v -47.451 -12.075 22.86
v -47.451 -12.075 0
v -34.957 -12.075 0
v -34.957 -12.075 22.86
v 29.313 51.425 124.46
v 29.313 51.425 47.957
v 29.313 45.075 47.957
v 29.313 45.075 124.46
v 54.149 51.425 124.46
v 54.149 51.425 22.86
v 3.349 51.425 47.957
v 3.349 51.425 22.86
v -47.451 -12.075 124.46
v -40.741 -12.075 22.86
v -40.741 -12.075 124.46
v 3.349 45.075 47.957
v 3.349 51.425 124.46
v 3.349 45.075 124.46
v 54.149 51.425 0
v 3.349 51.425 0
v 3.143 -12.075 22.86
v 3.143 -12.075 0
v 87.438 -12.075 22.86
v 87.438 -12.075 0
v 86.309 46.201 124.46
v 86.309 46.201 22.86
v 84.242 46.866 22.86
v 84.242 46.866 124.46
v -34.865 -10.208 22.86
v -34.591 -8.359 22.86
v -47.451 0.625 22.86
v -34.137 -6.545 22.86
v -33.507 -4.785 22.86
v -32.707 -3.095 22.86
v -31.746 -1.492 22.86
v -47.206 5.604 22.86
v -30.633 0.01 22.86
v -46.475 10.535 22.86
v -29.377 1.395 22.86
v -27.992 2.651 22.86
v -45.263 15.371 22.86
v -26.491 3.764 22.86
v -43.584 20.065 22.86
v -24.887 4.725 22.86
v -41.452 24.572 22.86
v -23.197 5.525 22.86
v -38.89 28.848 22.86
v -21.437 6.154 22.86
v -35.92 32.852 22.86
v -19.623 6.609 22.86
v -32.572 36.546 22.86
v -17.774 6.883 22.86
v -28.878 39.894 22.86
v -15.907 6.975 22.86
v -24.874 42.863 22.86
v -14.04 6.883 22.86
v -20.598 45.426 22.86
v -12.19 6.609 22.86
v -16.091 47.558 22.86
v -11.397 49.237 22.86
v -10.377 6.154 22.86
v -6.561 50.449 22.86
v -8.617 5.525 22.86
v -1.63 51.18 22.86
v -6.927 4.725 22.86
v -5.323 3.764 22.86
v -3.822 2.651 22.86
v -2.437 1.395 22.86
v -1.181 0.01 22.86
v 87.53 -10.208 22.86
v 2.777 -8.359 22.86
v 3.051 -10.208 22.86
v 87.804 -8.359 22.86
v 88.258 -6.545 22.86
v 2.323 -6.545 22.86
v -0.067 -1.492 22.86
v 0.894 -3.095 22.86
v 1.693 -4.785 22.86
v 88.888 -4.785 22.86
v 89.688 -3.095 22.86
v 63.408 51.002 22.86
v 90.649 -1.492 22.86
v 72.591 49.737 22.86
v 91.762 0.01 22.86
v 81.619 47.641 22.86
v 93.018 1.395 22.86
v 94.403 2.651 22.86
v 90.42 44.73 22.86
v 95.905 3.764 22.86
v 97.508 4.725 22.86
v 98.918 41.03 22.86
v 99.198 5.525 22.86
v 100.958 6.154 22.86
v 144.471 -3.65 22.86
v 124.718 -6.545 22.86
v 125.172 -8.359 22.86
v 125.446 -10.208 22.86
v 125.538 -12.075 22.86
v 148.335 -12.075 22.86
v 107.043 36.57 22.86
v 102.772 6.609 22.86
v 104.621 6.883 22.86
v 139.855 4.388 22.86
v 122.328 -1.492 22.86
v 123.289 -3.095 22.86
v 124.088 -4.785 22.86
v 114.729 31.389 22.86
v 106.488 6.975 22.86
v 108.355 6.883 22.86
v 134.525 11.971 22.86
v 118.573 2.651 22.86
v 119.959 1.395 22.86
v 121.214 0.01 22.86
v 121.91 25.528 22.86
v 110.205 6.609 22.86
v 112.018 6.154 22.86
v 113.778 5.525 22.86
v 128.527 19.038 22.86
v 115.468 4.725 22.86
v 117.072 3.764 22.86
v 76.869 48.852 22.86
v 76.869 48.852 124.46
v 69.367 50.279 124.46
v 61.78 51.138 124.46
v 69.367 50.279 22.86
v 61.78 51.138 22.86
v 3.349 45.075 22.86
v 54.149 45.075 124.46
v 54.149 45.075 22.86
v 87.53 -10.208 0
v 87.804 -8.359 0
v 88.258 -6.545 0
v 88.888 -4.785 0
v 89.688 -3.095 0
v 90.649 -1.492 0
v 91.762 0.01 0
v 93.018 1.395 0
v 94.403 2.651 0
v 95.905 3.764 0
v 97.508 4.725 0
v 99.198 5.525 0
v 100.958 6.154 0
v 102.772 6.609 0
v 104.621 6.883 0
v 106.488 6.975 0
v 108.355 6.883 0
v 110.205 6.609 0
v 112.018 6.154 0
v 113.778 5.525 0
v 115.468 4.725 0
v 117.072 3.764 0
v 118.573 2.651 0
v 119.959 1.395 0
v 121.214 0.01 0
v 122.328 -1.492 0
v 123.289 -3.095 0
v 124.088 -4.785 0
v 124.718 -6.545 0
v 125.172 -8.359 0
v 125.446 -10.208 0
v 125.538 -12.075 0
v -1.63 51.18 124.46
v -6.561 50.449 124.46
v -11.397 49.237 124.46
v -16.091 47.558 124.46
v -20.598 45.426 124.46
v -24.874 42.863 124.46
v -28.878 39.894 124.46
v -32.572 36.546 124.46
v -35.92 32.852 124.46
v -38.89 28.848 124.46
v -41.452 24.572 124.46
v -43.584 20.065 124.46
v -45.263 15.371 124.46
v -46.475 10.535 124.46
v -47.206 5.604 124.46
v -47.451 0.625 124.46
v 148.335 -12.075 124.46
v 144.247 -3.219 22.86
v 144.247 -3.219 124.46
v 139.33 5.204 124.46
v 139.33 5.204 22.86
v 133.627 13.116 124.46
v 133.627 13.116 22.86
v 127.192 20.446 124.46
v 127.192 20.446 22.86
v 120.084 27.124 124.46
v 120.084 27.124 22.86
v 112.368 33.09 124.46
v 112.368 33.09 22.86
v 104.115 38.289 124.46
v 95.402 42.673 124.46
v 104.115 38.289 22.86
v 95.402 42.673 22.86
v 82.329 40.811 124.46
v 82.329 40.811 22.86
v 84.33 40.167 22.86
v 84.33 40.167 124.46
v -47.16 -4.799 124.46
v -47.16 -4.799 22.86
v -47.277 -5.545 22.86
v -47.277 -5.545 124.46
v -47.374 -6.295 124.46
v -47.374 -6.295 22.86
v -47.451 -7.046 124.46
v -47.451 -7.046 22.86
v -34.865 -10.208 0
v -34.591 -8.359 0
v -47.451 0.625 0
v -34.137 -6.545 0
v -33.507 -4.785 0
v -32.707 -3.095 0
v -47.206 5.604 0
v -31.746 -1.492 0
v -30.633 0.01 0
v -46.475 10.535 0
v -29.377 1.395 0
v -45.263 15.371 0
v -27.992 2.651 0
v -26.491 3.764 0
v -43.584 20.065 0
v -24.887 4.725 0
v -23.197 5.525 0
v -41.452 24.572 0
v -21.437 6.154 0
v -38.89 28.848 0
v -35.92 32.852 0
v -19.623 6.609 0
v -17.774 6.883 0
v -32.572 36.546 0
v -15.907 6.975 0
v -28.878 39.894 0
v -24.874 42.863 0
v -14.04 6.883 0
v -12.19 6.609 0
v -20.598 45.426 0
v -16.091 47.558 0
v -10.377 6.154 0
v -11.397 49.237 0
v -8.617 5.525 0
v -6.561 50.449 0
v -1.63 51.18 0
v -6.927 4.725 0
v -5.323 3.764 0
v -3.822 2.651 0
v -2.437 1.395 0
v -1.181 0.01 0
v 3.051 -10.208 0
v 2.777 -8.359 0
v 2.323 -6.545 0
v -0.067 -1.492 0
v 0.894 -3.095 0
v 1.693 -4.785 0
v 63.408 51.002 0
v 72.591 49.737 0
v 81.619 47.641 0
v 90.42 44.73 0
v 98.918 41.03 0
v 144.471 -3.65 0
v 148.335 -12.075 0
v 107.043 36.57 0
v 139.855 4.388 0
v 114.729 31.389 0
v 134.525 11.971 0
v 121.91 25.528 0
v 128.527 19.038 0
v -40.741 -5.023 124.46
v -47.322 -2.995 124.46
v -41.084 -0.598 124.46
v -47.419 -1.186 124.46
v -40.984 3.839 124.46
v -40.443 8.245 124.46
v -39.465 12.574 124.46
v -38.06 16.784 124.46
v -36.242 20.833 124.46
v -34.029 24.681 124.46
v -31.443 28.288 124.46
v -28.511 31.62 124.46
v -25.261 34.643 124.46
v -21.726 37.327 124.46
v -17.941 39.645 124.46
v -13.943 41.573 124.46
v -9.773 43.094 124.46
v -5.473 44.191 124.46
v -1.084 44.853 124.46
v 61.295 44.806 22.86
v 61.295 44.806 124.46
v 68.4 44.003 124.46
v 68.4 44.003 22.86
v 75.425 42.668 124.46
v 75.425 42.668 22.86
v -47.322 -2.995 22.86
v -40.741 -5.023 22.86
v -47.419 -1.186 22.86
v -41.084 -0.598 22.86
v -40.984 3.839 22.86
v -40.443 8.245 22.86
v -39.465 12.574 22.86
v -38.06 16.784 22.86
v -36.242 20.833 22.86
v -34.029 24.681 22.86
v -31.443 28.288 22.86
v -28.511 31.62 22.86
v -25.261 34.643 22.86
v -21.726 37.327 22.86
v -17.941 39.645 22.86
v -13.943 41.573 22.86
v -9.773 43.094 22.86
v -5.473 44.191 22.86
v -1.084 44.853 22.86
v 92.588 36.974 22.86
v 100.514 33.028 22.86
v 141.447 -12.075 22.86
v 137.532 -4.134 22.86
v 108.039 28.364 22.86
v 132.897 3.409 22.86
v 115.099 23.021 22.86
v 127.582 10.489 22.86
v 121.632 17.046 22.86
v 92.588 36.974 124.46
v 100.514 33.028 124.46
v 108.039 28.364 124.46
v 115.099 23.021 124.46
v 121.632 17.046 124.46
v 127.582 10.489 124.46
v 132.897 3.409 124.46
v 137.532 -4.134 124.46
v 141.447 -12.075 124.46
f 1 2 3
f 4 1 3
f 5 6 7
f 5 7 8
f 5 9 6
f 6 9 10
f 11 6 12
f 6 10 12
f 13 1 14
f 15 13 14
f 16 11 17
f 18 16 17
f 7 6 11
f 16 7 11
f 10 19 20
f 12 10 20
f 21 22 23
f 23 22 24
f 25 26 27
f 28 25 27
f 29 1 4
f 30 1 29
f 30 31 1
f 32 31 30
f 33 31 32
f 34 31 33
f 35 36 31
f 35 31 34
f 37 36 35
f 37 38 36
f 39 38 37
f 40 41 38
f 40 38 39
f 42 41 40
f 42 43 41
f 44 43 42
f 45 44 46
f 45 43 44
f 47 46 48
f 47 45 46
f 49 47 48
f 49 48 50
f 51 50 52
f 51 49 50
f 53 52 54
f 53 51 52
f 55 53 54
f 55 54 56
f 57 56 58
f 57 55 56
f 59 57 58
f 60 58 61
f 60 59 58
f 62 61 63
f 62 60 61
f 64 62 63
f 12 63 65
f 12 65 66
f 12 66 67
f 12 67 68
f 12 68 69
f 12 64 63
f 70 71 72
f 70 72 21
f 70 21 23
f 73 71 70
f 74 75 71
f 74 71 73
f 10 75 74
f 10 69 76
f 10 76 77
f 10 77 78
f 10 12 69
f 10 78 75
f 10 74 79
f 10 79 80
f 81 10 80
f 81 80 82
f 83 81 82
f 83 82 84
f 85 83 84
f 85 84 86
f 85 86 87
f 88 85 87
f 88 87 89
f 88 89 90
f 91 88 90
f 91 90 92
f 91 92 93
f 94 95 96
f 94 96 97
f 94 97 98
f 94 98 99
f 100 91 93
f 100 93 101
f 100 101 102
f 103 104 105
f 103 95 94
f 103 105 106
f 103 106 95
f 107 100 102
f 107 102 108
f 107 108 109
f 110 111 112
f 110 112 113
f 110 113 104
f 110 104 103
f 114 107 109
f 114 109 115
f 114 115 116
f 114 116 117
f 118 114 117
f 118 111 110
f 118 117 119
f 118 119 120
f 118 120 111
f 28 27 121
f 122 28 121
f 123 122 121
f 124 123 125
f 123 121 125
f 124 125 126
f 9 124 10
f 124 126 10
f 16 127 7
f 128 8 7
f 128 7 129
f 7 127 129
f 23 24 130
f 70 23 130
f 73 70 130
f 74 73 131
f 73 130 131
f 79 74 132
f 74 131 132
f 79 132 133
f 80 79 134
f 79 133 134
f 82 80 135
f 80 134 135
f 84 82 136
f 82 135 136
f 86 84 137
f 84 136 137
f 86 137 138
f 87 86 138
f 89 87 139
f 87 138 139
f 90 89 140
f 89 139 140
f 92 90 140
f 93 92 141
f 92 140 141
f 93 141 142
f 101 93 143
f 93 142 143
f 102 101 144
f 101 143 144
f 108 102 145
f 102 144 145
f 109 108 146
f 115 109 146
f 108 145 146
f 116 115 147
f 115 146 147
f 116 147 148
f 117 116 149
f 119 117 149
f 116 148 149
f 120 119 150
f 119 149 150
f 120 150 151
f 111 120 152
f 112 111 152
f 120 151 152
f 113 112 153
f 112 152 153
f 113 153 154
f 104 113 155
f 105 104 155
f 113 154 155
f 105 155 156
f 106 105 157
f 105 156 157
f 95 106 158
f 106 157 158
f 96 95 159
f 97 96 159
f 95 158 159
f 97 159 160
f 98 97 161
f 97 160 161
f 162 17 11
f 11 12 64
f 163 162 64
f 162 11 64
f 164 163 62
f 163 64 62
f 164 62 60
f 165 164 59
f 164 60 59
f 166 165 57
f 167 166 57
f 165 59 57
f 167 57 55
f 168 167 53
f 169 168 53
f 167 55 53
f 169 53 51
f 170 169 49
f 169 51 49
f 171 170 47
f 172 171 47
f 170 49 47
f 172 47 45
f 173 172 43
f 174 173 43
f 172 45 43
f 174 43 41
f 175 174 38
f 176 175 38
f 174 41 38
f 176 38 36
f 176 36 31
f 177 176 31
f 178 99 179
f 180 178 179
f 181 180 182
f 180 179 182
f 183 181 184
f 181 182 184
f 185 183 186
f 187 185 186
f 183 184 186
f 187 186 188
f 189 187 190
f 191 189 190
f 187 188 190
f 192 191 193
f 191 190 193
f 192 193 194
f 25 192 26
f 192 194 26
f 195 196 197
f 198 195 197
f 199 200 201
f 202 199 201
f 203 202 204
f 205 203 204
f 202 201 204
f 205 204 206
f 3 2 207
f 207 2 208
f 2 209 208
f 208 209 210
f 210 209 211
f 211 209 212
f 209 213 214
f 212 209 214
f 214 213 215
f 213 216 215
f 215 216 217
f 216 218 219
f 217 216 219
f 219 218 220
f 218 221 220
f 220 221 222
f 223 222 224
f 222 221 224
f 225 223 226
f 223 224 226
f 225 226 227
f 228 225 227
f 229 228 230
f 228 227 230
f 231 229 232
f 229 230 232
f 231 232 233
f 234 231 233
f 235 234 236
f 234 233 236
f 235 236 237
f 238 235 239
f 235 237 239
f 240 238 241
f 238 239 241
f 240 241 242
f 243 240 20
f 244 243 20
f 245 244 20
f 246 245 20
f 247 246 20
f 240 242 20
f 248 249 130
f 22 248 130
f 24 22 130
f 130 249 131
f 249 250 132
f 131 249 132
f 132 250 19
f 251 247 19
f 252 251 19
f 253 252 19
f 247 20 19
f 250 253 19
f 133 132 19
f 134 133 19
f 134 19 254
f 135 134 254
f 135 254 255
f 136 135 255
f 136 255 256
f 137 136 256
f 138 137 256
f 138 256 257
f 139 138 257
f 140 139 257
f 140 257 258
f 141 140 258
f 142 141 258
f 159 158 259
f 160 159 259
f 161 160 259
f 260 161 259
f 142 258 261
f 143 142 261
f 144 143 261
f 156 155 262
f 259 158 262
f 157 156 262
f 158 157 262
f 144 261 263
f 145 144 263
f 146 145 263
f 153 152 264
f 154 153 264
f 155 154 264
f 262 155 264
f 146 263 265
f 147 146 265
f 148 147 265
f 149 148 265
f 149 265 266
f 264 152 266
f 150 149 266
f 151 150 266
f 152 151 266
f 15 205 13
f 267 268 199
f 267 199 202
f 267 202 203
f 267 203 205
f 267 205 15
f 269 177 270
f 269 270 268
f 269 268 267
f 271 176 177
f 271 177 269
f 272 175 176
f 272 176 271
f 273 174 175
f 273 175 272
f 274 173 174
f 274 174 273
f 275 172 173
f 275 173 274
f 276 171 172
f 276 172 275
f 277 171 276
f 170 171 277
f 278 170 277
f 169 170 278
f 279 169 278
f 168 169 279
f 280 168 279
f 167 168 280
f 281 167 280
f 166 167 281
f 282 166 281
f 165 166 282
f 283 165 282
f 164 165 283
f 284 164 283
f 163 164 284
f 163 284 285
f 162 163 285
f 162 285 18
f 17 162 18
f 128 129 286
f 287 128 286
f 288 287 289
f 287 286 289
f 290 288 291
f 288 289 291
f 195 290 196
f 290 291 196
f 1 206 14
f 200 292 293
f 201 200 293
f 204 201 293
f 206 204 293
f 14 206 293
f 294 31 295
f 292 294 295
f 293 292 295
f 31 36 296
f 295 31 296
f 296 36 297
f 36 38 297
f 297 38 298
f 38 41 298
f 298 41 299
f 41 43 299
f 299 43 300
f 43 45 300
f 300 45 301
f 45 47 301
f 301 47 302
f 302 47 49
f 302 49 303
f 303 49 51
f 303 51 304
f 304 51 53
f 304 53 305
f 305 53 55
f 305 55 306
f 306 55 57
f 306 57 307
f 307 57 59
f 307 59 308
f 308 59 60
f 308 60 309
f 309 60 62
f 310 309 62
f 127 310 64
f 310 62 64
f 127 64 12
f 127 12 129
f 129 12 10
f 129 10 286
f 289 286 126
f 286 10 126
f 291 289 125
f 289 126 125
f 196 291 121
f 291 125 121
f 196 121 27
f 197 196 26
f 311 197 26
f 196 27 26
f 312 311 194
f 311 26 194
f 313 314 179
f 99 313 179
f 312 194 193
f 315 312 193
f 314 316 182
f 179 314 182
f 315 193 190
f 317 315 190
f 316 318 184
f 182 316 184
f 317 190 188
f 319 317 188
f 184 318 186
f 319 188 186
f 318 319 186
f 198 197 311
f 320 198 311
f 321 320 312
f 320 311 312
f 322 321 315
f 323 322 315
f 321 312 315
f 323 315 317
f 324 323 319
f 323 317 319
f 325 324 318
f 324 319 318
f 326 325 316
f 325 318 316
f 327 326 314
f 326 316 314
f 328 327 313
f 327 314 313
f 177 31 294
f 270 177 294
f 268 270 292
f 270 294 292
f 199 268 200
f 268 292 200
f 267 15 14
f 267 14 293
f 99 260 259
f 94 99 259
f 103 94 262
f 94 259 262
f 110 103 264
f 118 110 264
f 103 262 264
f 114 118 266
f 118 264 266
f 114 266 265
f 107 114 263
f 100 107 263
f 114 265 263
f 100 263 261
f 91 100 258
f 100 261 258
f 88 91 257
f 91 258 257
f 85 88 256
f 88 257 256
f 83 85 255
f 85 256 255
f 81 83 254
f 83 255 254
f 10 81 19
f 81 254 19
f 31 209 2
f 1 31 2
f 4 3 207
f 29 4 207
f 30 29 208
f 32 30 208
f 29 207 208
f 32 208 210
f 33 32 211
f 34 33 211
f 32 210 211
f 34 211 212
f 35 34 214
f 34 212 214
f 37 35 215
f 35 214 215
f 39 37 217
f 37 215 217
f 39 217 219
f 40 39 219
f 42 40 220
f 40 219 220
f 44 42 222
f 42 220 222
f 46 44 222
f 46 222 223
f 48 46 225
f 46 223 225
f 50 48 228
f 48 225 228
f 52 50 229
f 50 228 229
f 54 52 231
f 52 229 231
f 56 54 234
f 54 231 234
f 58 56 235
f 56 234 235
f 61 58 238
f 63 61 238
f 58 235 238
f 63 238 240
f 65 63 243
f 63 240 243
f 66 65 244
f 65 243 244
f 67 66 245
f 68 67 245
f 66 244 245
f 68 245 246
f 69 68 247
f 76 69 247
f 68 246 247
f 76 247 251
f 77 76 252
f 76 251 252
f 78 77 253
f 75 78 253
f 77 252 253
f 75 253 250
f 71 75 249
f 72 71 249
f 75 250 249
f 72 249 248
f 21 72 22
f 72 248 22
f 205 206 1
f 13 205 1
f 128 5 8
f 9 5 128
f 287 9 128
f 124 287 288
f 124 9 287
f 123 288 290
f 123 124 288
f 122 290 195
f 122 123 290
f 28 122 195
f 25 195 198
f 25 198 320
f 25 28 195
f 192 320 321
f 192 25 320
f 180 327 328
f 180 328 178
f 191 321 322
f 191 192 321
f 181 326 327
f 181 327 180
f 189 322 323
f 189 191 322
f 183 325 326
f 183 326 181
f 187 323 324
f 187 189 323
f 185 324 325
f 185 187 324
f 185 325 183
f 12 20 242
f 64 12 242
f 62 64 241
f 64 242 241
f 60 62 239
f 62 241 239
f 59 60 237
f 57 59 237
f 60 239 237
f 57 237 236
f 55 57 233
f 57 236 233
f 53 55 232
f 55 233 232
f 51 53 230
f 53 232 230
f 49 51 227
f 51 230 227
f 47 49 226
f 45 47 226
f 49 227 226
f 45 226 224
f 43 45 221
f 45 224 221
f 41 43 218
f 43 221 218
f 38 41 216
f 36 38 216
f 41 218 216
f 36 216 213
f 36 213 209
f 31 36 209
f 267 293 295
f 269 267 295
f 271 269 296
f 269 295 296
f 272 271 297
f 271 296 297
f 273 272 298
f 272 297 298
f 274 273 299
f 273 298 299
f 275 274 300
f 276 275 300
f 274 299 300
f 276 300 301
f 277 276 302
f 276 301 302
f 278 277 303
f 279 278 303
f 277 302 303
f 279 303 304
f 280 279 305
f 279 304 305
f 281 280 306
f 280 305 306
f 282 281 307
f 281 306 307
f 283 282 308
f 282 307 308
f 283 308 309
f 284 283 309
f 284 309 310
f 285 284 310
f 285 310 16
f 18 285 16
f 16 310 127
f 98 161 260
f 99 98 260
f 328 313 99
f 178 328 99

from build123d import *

# Parameters (mm, degrees)
F1_DEPTH = 22.86
F3_DEPTH = 101.6
F4_W     = 25.9639685869
F4_H     = 76.5026504314
F5_DEPTH = 25.4


# Not quite as in the source:
# - ends of sketch curves that miss each other by under 0.0002 mm in the source are joined


with BuildPart() as f1:
    # F0 (on Top) → F1 (new body)
    with BuildSketch(Plane.XY):
        with BuildLine():
            Line((54.1491188765, 51.4247583449), (3.3491188765, 51.4247583449))
            ThreePointArc((3.3491188765, 51.4247583449), (-32.5719056078, 36.5457828292), (-47.4508811235, 0.6247583449))
            Line((-47.4508811235, 0.6247583449), (-47.4508811235, -12.0752416551))
            Line((-47.4508811235, -12.0752416551), (-34.9568908542, -12.0752416551))
            ThreePointArc((-34.9568908542, -12.0752416551), (-15.9068908542, 6.9747583449), (3.1431091458, -12.0752416551))
            Line((3.1431091458, -12.0752416551), (87.4382129431, -12.0752416551))
            ThreePointArc((87.4382129431, -12.0752416551), (106.4882129431, 6.9747583449), (125.5382129431, -12.0752416551))
            Line((125.5382129431, -12.0752416551), (148.3348396626, -12.0752416551))
            ThreePointArc((148.3348396626, -12.0752416551), (110.945245505, 34.0670280199), (54.1491188765, 51.4247583449))
        make_face()
    extrude(amount=F1_DEPTH)


with BuildPart() as f3:
    # F2 (on face) → F3 (new body)
    with BuildSketch(Plane.XY.offset(22.86)):
        with BuildLine():
            Line((15.9320533276, 51.4247583449), (3.3491188765, 51.4247583449))
            ThreePointArc((3.3491188765, 51.4247583449), (-32.5719056078, 36.5457828292), (-47.4508811235, 0.6247583449))
            ThreePointArc((-47.4508811235, 0.6247583449), (-47.3782321455, -2.091094798), (-47.1604930017, -4.7991800686))
            ThreePointArc((-47.1604930017, -4.7991800686), (-47.3280960303, -5.9197039916), (-47.4508811235, -7.0460203141))
            Line((-47.4508811235, -7.0460203141), (-47.4508811235, -12.0752416551))
            Line((-47.4508811235, -12.0752416551), (-40.7406055237, -12.0752416551))
            Line((-40.7406055237, -12.0752416551), (-40.7406055237, -5.0231332932))
            ThreePointArc((-40.7406055237, -5.0231332932), (-30.0189141756, 29.9910119001), (3.3491188765, 45.0747580933))
            Line((3.3491188765, 45.0747580933), (54.1491188765, 45.0747583449))
            ThreePointArc((54.1491188765, 45.0747583449), (68.3996721284, 44.0026988236), (82.3294388374, 40.8106490516))
            Line((82.3294388374, 40.8106490516), (84.3304985233, 40.1665928591))
            ThreePointArc((84.3304985233, 40.1665928591), (118.4348676457, 20.1092178361), (141.4471872445, -12.0752416551))
            Line((141.4471872445, -12.0752416551), (148.3348396626, -12.0752416551))
            ThreePointArc((148.3348396626, -12.0752416551), (123.7178725829, 23.8703423302), (86.3088204644, 46.2006557144))
            Line((86.3088204644, 46.2006557144), (84.242132955, 46.8658347181))
            ThreePointArc((84.242132955, 46.8658347181), (69.3673093156, 50.2785620546), (54.1491188765, 51.4247583449))
            Line((54.1491188765, 51.4247583449), (36.9653739035, 51.4247583449))
            Line((36.9653739035, 51.4247583449), (15.9320533276, 51.4247583449))
        make_face()
    extrude(amount=F3_DEPTH)

    # F4 (on face) → F5 (cut)
    with BuildSketch(Plane(origin=(0, 51.4247583449, 0), x_dir=(-1, 0, 0), z_dir=(0, 1, 0))):
        with Locations((-16.3311031699, 86.2086747843)):
            Rectangle(F4_W, F4_H)
    extrude(amount=-F5_DEPTH, mode=Mode.SUBTRACT)


solid = Compound([f1.part, f3.part])
